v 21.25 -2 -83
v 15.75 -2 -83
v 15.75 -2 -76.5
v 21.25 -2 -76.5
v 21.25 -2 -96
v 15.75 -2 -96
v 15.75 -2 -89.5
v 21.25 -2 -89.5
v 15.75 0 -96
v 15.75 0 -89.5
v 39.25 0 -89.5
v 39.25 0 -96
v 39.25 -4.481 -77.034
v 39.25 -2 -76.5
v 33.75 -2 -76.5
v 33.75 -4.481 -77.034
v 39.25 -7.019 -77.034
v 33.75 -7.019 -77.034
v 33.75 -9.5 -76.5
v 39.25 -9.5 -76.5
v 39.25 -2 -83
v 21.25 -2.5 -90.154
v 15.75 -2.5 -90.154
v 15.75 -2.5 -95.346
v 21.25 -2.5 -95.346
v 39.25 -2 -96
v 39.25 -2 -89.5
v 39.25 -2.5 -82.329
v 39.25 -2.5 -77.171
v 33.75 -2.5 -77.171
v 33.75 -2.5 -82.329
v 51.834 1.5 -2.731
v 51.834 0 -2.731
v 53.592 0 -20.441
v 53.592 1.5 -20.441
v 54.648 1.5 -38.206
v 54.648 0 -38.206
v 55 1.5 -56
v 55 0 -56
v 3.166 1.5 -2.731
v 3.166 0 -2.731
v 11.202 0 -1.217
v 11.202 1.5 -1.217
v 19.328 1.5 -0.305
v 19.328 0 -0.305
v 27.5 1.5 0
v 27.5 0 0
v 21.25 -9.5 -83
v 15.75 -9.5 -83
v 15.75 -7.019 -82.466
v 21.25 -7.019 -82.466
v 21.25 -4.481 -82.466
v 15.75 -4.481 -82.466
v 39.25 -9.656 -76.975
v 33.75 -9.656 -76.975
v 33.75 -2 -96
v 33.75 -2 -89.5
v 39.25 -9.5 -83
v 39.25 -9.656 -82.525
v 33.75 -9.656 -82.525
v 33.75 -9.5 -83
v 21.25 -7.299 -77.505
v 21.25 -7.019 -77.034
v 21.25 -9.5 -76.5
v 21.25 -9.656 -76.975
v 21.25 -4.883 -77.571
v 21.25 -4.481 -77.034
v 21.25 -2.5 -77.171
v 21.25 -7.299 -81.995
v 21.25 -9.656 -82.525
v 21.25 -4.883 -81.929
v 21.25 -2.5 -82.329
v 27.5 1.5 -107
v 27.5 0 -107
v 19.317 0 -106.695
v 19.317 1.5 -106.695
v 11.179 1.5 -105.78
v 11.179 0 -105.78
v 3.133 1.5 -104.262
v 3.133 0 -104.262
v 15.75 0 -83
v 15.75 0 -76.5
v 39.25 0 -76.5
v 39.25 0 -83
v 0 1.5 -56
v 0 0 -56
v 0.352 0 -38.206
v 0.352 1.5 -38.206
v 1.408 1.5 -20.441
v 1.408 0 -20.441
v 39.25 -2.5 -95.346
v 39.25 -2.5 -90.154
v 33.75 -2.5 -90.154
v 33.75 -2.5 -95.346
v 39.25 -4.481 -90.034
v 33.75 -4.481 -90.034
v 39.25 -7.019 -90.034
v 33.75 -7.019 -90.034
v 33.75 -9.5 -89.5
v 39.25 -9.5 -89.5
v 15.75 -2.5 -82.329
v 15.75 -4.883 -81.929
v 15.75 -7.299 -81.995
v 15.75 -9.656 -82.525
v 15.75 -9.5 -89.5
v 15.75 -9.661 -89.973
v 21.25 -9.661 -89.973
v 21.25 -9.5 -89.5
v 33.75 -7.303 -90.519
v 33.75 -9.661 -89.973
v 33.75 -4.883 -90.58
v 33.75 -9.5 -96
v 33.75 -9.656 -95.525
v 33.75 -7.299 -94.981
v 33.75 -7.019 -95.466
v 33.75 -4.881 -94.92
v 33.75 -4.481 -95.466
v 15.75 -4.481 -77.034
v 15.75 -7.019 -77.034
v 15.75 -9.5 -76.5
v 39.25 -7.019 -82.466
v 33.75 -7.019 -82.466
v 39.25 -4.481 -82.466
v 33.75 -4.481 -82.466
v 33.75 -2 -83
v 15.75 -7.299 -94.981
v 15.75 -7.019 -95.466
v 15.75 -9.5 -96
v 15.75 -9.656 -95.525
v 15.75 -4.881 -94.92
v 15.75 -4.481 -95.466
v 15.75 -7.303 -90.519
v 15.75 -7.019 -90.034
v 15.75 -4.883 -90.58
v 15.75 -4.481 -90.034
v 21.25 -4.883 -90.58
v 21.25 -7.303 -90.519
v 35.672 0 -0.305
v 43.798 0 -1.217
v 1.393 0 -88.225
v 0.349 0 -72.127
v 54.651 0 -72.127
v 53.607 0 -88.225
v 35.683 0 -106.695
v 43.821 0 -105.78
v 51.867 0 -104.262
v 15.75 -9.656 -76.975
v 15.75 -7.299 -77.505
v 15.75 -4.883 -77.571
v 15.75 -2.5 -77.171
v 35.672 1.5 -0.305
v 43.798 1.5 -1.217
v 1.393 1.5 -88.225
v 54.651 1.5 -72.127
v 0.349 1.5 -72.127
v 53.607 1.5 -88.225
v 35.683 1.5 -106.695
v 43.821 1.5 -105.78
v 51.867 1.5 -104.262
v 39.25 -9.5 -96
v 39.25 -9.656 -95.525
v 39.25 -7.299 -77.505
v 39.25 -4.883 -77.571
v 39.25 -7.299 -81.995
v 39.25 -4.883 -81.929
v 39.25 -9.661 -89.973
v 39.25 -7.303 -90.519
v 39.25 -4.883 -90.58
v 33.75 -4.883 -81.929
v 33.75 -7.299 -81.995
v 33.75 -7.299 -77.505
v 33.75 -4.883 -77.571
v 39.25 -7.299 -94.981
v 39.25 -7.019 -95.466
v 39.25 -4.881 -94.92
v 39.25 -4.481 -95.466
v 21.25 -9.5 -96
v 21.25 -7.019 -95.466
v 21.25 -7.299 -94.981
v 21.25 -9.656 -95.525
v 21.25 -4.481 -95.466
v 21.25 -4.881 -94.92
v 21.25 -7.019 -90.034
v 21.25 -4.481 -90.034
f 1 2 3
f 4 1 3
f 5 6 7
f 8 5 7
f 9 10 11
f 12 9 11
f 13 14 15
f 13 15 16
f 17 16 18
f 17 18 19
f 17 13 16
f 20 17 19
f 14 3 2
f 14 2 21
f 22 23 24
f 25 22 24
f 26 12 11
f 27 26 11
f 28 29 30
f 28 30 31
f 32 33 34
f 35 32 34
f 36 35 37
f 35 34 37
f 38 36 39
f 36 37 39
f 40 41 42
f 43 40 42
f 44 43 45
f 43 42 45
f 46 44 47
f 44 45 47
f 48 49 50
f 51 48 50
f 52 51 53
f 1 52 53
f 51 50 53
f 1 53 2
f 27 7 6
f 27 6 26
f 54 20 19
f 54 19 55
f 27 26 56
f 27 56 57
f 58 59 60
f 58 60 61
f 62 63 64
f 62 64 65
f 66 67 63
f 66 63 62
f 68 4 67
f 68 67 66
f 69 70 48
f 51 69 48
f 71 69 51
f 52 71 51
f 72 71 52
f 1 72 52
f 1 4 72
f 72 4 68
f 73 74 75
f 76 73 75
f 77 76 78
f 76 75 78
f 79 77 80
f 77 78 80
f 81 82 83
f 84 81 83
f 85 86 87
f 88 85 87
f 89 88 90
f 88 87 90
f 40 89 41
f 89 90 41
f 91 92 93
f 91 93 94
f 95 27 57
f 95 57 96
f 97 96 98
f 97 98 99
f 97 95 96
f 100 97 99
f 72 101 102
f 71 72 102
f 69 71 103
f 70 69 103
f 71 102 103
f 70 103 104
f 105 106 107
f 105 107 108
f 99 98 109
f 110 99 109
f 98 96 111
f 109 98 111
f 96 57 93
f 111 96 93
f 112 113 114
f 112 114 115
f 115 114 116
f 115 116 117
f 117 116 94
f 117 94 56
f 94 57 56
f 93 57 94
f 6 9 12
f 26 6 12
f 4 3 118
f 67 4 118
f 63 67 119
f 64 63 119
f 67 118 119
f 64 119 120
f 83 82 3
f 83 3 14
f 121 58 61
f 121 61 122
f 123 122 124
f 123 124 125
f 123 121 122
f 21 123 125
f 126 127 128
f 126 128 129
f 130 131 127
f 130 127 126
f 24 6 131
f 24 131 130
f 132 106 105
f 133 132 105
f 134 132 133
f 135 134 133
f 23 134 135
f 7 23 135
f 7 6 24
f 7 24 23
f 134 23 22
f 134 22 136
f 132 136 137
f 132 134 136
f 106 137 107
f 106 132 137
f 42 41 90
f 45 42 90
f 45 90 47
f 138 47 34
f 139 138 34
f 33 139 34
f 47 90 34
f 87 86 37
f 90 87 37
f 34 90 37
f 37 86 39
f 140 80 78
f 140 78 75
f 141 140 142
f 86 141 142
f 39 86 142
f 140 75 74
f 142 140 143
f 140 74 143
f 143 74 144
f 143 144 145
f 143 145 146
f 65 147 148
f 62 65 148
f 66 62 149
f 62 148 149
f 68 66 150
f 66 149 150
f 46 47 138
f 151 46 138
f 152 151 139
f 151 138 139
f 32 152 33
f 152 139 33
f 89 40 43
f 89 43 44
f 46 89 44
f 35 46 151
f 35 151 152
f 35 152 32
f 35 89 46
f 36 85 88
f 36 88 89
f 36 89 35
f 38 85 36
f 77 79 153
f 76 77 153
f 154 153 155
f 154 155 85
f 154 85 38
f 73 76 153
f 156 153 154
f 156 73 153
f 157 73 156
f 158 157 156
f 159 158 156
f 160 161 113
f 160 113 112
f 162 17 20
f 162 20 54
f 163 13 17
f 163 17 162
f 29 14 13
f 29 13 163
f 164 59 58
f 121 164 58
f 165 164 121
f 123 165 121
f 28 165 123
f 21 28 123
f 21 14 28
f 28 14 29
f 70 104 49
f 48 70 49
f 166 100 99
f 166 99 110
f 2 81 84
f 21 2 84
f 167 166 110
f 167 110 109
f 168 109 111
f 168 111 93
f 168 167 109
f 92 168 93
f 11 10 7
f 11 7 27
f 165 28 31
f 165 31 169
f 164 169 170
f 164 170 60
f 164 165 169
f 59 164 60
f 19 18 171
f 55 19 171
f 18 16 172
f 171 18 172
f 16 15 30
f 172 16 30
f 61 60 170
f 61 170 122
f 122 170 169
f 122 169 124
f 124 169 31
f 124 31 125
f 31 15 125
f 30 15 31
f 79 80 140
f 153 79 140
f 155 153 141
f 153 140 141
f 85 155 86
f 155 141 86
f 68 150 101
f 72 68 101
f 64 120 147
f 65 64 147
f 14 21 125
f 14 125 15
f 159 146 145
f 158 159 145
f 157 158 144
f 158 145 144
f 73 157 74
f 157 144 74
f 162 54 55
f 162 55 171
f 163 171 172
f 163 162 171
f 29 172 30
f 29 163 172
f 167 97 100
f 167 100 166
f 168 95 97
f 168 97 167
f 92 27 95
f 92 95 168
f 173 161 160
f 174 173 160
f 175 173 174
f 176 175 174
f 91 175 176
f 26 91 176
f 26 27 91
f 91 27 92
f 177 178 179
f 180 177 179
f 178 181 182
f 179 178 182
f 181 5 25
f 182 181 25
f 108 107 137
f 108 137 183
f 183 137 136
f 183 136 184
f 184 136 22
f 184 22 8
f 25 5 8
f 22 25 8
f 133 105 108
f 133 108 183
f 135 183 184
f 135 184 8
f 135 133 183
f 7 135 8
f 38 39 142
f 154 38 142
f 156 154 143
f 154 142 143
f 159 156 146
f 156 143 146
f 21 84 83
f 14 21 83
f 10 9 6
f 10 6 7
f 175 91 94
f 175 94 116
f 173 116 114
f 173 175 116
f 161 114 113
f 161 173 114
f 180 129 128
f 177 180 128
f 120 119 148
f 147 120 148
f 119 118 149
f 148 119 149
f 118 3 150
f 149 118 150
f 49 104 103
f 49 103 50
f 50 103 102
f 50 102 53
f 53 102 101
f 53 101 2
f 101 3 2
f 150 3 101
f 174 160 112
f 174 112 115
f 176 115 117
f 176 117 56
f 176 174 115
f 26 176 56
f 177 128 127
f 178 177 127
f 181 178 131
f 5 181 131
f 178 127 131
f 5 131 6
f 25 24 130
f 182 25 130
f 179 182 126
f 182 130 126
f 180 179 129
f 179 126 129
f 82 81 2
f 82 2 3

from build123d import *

# Parameters (mm, degrees)
BOSS_EXTRUDE1_DEPTH   = 1.5
SKETCH2_W             = 23.5
SKETCH2_H             = 6.5
BOSS_EXTRUDE2_DEPTH   = 2
BOSS_EXTRUDE2_2_DEPTH = 2
BOSS_EXTRUDE3_DEPTH   = 5.5
BOSS_EXTRUDE4_START   = -23.5
BOSS_EXTRUDE4_DEPTH   = 5.5


with BuildPart() as part:
    # Sketch1 → Boss-Extrude1 (new body)
    with BuildSketch(Plane(origin=(0, 0, 0), x_dir=(1, 0, 0), z_dir=(0, 1, 0))):
        with BuildLine():
            ThreePointArc((27.5, 107), (15.239653237, 106.313263521), (3.132689406, 104.261645493))
            ThreePointArc((3.132689406, 104.261645493), (0.783995568, 80.18160545), (0, 56))
            ThreePointArc((0, 56), (0.792144846, 29.318418419), (3.165788975, 2.730825397))
            ThreePointArc((3.165788975, 2.730825397), (15.25651976, 0.68484237), (27.5, 0))
            ThreePointArc((27.5, 0), (39.74348024, 0.68484237), (51.834211025, 2.730825397))
            ThreePointArc((51.834211025, 2.730825397), (54.207855154, 29.318418419), (55, 56))
            ThreePointArc((55, 56), (54.216004432, 80.18160545), (51.867310594, 104.261645493))
            ThreePointArc((51.867310594, 104.261645493), (39.760346763, 106.313263521), (27.5, 107))
        make_face()
    extrude(amount=BOSS_EXTRUDE1_DEPTH)


with BuildPart() as body_2:
    # Sketch2 → Boss-Extrude2 (new body)
    with BuildSketch(Plane.XZ):
        with Locations((27.5, -79.75)):
            Rectangle(SKETCH2_W, SKETCH2_H)
    extrude(amount=BOSS_EXTRUDE2_DEPTH)


with BuildPart() as body_3:
    # Sketch2 → Boss-Extrude2 2 (new body)
    with BuildSketch(Plane.XZ):
        with Locations((27.5, -92.75)):
            Rectangle(SKETCH2_W, SKETCH2_H)
    extrude(amount=BOSS_EXTRUDE2_2_DEPTH)


with BuildPart() as body_4:
    # Sketch3 → Boss-Extrude3 (new body)
    with BuildSketch(Plane(origin=(39.25, 0, 0), x_dir=(0, 0, -1), z_dir=(1, 0, 0))):
        with BuildLine():
            Line((82.52504112, -9.65625), (83, -9.5))
            ThreePointArc((83, -9.5), (82.399013115, -5.75), (83, -2))
            Line((83, -2), (82.474773097, -2))
            ThreePointArc((82.474773097, -2), (82.399234757, -2.249240176), (82.328905411, -2.5))
            ThreePointArc((82.328905411, -2.5), (81.903705329, -6.092466524), (82.52504112, -9.65625))
        make_face()
        with BuildLine():
            Line((77.171094589, -2.5), (82.328905411, -2.5))
            ThreePointArc((82.328905411, -2.5), (82.399234757, -2.249240176), (82.474773097, -2))
            Line((82.474773097, -2), (77.025226903, -2))
            ThreePointArc((77.025226903, -2), (77.100765243, -2.249240176), (77.171094589, -2.5))
        make_face()
        with BuildLine():
            ThreePointArc((76.97495888, -9.65625), (77.596294671, -6.092466524), (77.171094589, -2.5))
            ThreePointArc((77.171094589, -2.5), (77.100765243, -2.249240176), (77.025226903, -2))
            Line((77.025226903, -2), (76.5, -2))
            ThreePointArc((76.5, -2), (77.100986885, -5.75), (76.5, -9.5))
            Line((76.5, -9.5), (76.97495888, -9.65625))
        make_face()
        with BuildLine():
            Line((95.52504112, -9.65625), (96, -9.5))
            ThreePointArc((96, -9.5), (95.399013115, -5.75), (96, -2))
            Line((96, -2), (95.5, -2))
            ThreePointArc((95.5, -2), (95.420046877, -2.249157942), (95.345545576, -2.5))
            ThreePointArc((95.345545576, -2.5), (94.88924031, -6.091821292), (95.52504112, -9.65625))
        make_face()
        with BuildLine():
            Line((90.154456431, -2.5), (95.345545576, -2.5))
            ThreePointArc((95.345545576, -2.5), (95.420046877, -2.249157942), (95.5, -2))
            Line((95.5, -2), (90, -2))
            ThreePointArc((90, -2), (90.07995413, -2.24915793), (90.154456431, -2.5))
        make_face()
        with BuildLine():
            ThreePointArc((89.973280581, -9.661262184), (90.610708118, -6.094465822), (90.154456431, -2.5))
            ThreePointArc((90.154456431, -2.5), (90.07995413, -2.24915793), (90, -2))
            Line((90, -2), (89.5, -2))
            ThreePointArc((89.5, -2), (90.100986885, -5.75), (89.5, -9.5))
            Line((89.5, -9.5), (89.973280581, -9.661262184))
        make_face()
    extrude(amount=-BOSS_EXTRUDE3_DEPTH)


with BuildPart() as body_5:
    # Sketch3<3> → Boss-Extrude4 (new body)
    with BuildSketch(Plane(origin=(39.25, 0, 0), x_dir=(0, 0, -1), z_dir=(1, 0, 0)).offset(BOSS_EXTRUDE4_START)):
        with BuildLine():
            Line((82.52504112, -9.65625), (83, -9.5))
            ThreePointArc((83, -9.5), (82.399013115, -5.75), (83, -2))
            Line((83, -2), (82.474773097, -2))
            ThreePointArc((82.474773097, -2), (82.399234757, -2.249240176), (82.328905411, -2.5))
            ThreePointArc((82.328905411, -2.5), (81.903705329, -6.092466524), (82.52504112, -9.65625))
        make_face()
        with BuildLine():
            Line((77.171094589, -2.5), (82.328905411, -2.5))
            ThreePointArc((82.328905411, -2.5), (82.399234757, -2.249240176), (82.474773097, -2))
            Line((82.474773097, -2), (77.025226903, -2))
            ThreePointArc((77.025226903, -2), (77.100765243, -2.249240176), (77.171094589, -2.5))
        make_face()
        with BuildLine():
            ThreePointArc((76.97495888, -9.65625), (77.596294671, -6.092466524), (77.171094589, -2.5))
            ThreePointArc((77.171094589, -2.5), (77.100765243, -2.249240176), (77.025226903, -2))
            Line((77.025226903, -2), (76.5, -2))
            ThreePointArc((76.5, -2), (77.100986885, -5.75), (76.5, -9.5))
            Line((76.5, -9.5), (76.97495888, -9.65625))
        make_face()
        with BuildLine():
            ThreePointArc((90, -2), (90.614473663, -5.832820724), (89.973280581, -9.661262184))
            Line((89.973280581, -9.661262184), (89.5, -9.5))
            ThreePointArc((89.5, -9.5), (90.100986885, -5.75), (89.5, -2))
            Line((89.5, -2), (90, -2))
        make_face()
        with BuildLine():
            Line((90.154456431, -2.5), (95.345545576, -2.5))
            ThreePointArc((95.345545576, -2.5), (95.420046877, -2.249157942), (95.5, -2))
            Line((95.5, -2), (90, -2))
            ThreePointArc((90, -2), (90.07995413, -2.24915793), (90.154456431, -2.5))
        make_face()
        with BuildLine():
            Line((96, -2), (95.5, -2))
            ThreePointArc((95.5, -2), (94.885531529, -5.830175679), (95.52504112, -9.65625))
            Line((95.52504112, -9.65625), (96, -9.5))
            ThreePointArc((96, -9.5), (95.399013115, -5.75), (96, -2))
        make_face()
    extrude(amount=BOSS_EXTRUDE4_DEPTH)


solid = Compound([part.part, body_2.part, body_3.part, body_4.part, body_5.part])
